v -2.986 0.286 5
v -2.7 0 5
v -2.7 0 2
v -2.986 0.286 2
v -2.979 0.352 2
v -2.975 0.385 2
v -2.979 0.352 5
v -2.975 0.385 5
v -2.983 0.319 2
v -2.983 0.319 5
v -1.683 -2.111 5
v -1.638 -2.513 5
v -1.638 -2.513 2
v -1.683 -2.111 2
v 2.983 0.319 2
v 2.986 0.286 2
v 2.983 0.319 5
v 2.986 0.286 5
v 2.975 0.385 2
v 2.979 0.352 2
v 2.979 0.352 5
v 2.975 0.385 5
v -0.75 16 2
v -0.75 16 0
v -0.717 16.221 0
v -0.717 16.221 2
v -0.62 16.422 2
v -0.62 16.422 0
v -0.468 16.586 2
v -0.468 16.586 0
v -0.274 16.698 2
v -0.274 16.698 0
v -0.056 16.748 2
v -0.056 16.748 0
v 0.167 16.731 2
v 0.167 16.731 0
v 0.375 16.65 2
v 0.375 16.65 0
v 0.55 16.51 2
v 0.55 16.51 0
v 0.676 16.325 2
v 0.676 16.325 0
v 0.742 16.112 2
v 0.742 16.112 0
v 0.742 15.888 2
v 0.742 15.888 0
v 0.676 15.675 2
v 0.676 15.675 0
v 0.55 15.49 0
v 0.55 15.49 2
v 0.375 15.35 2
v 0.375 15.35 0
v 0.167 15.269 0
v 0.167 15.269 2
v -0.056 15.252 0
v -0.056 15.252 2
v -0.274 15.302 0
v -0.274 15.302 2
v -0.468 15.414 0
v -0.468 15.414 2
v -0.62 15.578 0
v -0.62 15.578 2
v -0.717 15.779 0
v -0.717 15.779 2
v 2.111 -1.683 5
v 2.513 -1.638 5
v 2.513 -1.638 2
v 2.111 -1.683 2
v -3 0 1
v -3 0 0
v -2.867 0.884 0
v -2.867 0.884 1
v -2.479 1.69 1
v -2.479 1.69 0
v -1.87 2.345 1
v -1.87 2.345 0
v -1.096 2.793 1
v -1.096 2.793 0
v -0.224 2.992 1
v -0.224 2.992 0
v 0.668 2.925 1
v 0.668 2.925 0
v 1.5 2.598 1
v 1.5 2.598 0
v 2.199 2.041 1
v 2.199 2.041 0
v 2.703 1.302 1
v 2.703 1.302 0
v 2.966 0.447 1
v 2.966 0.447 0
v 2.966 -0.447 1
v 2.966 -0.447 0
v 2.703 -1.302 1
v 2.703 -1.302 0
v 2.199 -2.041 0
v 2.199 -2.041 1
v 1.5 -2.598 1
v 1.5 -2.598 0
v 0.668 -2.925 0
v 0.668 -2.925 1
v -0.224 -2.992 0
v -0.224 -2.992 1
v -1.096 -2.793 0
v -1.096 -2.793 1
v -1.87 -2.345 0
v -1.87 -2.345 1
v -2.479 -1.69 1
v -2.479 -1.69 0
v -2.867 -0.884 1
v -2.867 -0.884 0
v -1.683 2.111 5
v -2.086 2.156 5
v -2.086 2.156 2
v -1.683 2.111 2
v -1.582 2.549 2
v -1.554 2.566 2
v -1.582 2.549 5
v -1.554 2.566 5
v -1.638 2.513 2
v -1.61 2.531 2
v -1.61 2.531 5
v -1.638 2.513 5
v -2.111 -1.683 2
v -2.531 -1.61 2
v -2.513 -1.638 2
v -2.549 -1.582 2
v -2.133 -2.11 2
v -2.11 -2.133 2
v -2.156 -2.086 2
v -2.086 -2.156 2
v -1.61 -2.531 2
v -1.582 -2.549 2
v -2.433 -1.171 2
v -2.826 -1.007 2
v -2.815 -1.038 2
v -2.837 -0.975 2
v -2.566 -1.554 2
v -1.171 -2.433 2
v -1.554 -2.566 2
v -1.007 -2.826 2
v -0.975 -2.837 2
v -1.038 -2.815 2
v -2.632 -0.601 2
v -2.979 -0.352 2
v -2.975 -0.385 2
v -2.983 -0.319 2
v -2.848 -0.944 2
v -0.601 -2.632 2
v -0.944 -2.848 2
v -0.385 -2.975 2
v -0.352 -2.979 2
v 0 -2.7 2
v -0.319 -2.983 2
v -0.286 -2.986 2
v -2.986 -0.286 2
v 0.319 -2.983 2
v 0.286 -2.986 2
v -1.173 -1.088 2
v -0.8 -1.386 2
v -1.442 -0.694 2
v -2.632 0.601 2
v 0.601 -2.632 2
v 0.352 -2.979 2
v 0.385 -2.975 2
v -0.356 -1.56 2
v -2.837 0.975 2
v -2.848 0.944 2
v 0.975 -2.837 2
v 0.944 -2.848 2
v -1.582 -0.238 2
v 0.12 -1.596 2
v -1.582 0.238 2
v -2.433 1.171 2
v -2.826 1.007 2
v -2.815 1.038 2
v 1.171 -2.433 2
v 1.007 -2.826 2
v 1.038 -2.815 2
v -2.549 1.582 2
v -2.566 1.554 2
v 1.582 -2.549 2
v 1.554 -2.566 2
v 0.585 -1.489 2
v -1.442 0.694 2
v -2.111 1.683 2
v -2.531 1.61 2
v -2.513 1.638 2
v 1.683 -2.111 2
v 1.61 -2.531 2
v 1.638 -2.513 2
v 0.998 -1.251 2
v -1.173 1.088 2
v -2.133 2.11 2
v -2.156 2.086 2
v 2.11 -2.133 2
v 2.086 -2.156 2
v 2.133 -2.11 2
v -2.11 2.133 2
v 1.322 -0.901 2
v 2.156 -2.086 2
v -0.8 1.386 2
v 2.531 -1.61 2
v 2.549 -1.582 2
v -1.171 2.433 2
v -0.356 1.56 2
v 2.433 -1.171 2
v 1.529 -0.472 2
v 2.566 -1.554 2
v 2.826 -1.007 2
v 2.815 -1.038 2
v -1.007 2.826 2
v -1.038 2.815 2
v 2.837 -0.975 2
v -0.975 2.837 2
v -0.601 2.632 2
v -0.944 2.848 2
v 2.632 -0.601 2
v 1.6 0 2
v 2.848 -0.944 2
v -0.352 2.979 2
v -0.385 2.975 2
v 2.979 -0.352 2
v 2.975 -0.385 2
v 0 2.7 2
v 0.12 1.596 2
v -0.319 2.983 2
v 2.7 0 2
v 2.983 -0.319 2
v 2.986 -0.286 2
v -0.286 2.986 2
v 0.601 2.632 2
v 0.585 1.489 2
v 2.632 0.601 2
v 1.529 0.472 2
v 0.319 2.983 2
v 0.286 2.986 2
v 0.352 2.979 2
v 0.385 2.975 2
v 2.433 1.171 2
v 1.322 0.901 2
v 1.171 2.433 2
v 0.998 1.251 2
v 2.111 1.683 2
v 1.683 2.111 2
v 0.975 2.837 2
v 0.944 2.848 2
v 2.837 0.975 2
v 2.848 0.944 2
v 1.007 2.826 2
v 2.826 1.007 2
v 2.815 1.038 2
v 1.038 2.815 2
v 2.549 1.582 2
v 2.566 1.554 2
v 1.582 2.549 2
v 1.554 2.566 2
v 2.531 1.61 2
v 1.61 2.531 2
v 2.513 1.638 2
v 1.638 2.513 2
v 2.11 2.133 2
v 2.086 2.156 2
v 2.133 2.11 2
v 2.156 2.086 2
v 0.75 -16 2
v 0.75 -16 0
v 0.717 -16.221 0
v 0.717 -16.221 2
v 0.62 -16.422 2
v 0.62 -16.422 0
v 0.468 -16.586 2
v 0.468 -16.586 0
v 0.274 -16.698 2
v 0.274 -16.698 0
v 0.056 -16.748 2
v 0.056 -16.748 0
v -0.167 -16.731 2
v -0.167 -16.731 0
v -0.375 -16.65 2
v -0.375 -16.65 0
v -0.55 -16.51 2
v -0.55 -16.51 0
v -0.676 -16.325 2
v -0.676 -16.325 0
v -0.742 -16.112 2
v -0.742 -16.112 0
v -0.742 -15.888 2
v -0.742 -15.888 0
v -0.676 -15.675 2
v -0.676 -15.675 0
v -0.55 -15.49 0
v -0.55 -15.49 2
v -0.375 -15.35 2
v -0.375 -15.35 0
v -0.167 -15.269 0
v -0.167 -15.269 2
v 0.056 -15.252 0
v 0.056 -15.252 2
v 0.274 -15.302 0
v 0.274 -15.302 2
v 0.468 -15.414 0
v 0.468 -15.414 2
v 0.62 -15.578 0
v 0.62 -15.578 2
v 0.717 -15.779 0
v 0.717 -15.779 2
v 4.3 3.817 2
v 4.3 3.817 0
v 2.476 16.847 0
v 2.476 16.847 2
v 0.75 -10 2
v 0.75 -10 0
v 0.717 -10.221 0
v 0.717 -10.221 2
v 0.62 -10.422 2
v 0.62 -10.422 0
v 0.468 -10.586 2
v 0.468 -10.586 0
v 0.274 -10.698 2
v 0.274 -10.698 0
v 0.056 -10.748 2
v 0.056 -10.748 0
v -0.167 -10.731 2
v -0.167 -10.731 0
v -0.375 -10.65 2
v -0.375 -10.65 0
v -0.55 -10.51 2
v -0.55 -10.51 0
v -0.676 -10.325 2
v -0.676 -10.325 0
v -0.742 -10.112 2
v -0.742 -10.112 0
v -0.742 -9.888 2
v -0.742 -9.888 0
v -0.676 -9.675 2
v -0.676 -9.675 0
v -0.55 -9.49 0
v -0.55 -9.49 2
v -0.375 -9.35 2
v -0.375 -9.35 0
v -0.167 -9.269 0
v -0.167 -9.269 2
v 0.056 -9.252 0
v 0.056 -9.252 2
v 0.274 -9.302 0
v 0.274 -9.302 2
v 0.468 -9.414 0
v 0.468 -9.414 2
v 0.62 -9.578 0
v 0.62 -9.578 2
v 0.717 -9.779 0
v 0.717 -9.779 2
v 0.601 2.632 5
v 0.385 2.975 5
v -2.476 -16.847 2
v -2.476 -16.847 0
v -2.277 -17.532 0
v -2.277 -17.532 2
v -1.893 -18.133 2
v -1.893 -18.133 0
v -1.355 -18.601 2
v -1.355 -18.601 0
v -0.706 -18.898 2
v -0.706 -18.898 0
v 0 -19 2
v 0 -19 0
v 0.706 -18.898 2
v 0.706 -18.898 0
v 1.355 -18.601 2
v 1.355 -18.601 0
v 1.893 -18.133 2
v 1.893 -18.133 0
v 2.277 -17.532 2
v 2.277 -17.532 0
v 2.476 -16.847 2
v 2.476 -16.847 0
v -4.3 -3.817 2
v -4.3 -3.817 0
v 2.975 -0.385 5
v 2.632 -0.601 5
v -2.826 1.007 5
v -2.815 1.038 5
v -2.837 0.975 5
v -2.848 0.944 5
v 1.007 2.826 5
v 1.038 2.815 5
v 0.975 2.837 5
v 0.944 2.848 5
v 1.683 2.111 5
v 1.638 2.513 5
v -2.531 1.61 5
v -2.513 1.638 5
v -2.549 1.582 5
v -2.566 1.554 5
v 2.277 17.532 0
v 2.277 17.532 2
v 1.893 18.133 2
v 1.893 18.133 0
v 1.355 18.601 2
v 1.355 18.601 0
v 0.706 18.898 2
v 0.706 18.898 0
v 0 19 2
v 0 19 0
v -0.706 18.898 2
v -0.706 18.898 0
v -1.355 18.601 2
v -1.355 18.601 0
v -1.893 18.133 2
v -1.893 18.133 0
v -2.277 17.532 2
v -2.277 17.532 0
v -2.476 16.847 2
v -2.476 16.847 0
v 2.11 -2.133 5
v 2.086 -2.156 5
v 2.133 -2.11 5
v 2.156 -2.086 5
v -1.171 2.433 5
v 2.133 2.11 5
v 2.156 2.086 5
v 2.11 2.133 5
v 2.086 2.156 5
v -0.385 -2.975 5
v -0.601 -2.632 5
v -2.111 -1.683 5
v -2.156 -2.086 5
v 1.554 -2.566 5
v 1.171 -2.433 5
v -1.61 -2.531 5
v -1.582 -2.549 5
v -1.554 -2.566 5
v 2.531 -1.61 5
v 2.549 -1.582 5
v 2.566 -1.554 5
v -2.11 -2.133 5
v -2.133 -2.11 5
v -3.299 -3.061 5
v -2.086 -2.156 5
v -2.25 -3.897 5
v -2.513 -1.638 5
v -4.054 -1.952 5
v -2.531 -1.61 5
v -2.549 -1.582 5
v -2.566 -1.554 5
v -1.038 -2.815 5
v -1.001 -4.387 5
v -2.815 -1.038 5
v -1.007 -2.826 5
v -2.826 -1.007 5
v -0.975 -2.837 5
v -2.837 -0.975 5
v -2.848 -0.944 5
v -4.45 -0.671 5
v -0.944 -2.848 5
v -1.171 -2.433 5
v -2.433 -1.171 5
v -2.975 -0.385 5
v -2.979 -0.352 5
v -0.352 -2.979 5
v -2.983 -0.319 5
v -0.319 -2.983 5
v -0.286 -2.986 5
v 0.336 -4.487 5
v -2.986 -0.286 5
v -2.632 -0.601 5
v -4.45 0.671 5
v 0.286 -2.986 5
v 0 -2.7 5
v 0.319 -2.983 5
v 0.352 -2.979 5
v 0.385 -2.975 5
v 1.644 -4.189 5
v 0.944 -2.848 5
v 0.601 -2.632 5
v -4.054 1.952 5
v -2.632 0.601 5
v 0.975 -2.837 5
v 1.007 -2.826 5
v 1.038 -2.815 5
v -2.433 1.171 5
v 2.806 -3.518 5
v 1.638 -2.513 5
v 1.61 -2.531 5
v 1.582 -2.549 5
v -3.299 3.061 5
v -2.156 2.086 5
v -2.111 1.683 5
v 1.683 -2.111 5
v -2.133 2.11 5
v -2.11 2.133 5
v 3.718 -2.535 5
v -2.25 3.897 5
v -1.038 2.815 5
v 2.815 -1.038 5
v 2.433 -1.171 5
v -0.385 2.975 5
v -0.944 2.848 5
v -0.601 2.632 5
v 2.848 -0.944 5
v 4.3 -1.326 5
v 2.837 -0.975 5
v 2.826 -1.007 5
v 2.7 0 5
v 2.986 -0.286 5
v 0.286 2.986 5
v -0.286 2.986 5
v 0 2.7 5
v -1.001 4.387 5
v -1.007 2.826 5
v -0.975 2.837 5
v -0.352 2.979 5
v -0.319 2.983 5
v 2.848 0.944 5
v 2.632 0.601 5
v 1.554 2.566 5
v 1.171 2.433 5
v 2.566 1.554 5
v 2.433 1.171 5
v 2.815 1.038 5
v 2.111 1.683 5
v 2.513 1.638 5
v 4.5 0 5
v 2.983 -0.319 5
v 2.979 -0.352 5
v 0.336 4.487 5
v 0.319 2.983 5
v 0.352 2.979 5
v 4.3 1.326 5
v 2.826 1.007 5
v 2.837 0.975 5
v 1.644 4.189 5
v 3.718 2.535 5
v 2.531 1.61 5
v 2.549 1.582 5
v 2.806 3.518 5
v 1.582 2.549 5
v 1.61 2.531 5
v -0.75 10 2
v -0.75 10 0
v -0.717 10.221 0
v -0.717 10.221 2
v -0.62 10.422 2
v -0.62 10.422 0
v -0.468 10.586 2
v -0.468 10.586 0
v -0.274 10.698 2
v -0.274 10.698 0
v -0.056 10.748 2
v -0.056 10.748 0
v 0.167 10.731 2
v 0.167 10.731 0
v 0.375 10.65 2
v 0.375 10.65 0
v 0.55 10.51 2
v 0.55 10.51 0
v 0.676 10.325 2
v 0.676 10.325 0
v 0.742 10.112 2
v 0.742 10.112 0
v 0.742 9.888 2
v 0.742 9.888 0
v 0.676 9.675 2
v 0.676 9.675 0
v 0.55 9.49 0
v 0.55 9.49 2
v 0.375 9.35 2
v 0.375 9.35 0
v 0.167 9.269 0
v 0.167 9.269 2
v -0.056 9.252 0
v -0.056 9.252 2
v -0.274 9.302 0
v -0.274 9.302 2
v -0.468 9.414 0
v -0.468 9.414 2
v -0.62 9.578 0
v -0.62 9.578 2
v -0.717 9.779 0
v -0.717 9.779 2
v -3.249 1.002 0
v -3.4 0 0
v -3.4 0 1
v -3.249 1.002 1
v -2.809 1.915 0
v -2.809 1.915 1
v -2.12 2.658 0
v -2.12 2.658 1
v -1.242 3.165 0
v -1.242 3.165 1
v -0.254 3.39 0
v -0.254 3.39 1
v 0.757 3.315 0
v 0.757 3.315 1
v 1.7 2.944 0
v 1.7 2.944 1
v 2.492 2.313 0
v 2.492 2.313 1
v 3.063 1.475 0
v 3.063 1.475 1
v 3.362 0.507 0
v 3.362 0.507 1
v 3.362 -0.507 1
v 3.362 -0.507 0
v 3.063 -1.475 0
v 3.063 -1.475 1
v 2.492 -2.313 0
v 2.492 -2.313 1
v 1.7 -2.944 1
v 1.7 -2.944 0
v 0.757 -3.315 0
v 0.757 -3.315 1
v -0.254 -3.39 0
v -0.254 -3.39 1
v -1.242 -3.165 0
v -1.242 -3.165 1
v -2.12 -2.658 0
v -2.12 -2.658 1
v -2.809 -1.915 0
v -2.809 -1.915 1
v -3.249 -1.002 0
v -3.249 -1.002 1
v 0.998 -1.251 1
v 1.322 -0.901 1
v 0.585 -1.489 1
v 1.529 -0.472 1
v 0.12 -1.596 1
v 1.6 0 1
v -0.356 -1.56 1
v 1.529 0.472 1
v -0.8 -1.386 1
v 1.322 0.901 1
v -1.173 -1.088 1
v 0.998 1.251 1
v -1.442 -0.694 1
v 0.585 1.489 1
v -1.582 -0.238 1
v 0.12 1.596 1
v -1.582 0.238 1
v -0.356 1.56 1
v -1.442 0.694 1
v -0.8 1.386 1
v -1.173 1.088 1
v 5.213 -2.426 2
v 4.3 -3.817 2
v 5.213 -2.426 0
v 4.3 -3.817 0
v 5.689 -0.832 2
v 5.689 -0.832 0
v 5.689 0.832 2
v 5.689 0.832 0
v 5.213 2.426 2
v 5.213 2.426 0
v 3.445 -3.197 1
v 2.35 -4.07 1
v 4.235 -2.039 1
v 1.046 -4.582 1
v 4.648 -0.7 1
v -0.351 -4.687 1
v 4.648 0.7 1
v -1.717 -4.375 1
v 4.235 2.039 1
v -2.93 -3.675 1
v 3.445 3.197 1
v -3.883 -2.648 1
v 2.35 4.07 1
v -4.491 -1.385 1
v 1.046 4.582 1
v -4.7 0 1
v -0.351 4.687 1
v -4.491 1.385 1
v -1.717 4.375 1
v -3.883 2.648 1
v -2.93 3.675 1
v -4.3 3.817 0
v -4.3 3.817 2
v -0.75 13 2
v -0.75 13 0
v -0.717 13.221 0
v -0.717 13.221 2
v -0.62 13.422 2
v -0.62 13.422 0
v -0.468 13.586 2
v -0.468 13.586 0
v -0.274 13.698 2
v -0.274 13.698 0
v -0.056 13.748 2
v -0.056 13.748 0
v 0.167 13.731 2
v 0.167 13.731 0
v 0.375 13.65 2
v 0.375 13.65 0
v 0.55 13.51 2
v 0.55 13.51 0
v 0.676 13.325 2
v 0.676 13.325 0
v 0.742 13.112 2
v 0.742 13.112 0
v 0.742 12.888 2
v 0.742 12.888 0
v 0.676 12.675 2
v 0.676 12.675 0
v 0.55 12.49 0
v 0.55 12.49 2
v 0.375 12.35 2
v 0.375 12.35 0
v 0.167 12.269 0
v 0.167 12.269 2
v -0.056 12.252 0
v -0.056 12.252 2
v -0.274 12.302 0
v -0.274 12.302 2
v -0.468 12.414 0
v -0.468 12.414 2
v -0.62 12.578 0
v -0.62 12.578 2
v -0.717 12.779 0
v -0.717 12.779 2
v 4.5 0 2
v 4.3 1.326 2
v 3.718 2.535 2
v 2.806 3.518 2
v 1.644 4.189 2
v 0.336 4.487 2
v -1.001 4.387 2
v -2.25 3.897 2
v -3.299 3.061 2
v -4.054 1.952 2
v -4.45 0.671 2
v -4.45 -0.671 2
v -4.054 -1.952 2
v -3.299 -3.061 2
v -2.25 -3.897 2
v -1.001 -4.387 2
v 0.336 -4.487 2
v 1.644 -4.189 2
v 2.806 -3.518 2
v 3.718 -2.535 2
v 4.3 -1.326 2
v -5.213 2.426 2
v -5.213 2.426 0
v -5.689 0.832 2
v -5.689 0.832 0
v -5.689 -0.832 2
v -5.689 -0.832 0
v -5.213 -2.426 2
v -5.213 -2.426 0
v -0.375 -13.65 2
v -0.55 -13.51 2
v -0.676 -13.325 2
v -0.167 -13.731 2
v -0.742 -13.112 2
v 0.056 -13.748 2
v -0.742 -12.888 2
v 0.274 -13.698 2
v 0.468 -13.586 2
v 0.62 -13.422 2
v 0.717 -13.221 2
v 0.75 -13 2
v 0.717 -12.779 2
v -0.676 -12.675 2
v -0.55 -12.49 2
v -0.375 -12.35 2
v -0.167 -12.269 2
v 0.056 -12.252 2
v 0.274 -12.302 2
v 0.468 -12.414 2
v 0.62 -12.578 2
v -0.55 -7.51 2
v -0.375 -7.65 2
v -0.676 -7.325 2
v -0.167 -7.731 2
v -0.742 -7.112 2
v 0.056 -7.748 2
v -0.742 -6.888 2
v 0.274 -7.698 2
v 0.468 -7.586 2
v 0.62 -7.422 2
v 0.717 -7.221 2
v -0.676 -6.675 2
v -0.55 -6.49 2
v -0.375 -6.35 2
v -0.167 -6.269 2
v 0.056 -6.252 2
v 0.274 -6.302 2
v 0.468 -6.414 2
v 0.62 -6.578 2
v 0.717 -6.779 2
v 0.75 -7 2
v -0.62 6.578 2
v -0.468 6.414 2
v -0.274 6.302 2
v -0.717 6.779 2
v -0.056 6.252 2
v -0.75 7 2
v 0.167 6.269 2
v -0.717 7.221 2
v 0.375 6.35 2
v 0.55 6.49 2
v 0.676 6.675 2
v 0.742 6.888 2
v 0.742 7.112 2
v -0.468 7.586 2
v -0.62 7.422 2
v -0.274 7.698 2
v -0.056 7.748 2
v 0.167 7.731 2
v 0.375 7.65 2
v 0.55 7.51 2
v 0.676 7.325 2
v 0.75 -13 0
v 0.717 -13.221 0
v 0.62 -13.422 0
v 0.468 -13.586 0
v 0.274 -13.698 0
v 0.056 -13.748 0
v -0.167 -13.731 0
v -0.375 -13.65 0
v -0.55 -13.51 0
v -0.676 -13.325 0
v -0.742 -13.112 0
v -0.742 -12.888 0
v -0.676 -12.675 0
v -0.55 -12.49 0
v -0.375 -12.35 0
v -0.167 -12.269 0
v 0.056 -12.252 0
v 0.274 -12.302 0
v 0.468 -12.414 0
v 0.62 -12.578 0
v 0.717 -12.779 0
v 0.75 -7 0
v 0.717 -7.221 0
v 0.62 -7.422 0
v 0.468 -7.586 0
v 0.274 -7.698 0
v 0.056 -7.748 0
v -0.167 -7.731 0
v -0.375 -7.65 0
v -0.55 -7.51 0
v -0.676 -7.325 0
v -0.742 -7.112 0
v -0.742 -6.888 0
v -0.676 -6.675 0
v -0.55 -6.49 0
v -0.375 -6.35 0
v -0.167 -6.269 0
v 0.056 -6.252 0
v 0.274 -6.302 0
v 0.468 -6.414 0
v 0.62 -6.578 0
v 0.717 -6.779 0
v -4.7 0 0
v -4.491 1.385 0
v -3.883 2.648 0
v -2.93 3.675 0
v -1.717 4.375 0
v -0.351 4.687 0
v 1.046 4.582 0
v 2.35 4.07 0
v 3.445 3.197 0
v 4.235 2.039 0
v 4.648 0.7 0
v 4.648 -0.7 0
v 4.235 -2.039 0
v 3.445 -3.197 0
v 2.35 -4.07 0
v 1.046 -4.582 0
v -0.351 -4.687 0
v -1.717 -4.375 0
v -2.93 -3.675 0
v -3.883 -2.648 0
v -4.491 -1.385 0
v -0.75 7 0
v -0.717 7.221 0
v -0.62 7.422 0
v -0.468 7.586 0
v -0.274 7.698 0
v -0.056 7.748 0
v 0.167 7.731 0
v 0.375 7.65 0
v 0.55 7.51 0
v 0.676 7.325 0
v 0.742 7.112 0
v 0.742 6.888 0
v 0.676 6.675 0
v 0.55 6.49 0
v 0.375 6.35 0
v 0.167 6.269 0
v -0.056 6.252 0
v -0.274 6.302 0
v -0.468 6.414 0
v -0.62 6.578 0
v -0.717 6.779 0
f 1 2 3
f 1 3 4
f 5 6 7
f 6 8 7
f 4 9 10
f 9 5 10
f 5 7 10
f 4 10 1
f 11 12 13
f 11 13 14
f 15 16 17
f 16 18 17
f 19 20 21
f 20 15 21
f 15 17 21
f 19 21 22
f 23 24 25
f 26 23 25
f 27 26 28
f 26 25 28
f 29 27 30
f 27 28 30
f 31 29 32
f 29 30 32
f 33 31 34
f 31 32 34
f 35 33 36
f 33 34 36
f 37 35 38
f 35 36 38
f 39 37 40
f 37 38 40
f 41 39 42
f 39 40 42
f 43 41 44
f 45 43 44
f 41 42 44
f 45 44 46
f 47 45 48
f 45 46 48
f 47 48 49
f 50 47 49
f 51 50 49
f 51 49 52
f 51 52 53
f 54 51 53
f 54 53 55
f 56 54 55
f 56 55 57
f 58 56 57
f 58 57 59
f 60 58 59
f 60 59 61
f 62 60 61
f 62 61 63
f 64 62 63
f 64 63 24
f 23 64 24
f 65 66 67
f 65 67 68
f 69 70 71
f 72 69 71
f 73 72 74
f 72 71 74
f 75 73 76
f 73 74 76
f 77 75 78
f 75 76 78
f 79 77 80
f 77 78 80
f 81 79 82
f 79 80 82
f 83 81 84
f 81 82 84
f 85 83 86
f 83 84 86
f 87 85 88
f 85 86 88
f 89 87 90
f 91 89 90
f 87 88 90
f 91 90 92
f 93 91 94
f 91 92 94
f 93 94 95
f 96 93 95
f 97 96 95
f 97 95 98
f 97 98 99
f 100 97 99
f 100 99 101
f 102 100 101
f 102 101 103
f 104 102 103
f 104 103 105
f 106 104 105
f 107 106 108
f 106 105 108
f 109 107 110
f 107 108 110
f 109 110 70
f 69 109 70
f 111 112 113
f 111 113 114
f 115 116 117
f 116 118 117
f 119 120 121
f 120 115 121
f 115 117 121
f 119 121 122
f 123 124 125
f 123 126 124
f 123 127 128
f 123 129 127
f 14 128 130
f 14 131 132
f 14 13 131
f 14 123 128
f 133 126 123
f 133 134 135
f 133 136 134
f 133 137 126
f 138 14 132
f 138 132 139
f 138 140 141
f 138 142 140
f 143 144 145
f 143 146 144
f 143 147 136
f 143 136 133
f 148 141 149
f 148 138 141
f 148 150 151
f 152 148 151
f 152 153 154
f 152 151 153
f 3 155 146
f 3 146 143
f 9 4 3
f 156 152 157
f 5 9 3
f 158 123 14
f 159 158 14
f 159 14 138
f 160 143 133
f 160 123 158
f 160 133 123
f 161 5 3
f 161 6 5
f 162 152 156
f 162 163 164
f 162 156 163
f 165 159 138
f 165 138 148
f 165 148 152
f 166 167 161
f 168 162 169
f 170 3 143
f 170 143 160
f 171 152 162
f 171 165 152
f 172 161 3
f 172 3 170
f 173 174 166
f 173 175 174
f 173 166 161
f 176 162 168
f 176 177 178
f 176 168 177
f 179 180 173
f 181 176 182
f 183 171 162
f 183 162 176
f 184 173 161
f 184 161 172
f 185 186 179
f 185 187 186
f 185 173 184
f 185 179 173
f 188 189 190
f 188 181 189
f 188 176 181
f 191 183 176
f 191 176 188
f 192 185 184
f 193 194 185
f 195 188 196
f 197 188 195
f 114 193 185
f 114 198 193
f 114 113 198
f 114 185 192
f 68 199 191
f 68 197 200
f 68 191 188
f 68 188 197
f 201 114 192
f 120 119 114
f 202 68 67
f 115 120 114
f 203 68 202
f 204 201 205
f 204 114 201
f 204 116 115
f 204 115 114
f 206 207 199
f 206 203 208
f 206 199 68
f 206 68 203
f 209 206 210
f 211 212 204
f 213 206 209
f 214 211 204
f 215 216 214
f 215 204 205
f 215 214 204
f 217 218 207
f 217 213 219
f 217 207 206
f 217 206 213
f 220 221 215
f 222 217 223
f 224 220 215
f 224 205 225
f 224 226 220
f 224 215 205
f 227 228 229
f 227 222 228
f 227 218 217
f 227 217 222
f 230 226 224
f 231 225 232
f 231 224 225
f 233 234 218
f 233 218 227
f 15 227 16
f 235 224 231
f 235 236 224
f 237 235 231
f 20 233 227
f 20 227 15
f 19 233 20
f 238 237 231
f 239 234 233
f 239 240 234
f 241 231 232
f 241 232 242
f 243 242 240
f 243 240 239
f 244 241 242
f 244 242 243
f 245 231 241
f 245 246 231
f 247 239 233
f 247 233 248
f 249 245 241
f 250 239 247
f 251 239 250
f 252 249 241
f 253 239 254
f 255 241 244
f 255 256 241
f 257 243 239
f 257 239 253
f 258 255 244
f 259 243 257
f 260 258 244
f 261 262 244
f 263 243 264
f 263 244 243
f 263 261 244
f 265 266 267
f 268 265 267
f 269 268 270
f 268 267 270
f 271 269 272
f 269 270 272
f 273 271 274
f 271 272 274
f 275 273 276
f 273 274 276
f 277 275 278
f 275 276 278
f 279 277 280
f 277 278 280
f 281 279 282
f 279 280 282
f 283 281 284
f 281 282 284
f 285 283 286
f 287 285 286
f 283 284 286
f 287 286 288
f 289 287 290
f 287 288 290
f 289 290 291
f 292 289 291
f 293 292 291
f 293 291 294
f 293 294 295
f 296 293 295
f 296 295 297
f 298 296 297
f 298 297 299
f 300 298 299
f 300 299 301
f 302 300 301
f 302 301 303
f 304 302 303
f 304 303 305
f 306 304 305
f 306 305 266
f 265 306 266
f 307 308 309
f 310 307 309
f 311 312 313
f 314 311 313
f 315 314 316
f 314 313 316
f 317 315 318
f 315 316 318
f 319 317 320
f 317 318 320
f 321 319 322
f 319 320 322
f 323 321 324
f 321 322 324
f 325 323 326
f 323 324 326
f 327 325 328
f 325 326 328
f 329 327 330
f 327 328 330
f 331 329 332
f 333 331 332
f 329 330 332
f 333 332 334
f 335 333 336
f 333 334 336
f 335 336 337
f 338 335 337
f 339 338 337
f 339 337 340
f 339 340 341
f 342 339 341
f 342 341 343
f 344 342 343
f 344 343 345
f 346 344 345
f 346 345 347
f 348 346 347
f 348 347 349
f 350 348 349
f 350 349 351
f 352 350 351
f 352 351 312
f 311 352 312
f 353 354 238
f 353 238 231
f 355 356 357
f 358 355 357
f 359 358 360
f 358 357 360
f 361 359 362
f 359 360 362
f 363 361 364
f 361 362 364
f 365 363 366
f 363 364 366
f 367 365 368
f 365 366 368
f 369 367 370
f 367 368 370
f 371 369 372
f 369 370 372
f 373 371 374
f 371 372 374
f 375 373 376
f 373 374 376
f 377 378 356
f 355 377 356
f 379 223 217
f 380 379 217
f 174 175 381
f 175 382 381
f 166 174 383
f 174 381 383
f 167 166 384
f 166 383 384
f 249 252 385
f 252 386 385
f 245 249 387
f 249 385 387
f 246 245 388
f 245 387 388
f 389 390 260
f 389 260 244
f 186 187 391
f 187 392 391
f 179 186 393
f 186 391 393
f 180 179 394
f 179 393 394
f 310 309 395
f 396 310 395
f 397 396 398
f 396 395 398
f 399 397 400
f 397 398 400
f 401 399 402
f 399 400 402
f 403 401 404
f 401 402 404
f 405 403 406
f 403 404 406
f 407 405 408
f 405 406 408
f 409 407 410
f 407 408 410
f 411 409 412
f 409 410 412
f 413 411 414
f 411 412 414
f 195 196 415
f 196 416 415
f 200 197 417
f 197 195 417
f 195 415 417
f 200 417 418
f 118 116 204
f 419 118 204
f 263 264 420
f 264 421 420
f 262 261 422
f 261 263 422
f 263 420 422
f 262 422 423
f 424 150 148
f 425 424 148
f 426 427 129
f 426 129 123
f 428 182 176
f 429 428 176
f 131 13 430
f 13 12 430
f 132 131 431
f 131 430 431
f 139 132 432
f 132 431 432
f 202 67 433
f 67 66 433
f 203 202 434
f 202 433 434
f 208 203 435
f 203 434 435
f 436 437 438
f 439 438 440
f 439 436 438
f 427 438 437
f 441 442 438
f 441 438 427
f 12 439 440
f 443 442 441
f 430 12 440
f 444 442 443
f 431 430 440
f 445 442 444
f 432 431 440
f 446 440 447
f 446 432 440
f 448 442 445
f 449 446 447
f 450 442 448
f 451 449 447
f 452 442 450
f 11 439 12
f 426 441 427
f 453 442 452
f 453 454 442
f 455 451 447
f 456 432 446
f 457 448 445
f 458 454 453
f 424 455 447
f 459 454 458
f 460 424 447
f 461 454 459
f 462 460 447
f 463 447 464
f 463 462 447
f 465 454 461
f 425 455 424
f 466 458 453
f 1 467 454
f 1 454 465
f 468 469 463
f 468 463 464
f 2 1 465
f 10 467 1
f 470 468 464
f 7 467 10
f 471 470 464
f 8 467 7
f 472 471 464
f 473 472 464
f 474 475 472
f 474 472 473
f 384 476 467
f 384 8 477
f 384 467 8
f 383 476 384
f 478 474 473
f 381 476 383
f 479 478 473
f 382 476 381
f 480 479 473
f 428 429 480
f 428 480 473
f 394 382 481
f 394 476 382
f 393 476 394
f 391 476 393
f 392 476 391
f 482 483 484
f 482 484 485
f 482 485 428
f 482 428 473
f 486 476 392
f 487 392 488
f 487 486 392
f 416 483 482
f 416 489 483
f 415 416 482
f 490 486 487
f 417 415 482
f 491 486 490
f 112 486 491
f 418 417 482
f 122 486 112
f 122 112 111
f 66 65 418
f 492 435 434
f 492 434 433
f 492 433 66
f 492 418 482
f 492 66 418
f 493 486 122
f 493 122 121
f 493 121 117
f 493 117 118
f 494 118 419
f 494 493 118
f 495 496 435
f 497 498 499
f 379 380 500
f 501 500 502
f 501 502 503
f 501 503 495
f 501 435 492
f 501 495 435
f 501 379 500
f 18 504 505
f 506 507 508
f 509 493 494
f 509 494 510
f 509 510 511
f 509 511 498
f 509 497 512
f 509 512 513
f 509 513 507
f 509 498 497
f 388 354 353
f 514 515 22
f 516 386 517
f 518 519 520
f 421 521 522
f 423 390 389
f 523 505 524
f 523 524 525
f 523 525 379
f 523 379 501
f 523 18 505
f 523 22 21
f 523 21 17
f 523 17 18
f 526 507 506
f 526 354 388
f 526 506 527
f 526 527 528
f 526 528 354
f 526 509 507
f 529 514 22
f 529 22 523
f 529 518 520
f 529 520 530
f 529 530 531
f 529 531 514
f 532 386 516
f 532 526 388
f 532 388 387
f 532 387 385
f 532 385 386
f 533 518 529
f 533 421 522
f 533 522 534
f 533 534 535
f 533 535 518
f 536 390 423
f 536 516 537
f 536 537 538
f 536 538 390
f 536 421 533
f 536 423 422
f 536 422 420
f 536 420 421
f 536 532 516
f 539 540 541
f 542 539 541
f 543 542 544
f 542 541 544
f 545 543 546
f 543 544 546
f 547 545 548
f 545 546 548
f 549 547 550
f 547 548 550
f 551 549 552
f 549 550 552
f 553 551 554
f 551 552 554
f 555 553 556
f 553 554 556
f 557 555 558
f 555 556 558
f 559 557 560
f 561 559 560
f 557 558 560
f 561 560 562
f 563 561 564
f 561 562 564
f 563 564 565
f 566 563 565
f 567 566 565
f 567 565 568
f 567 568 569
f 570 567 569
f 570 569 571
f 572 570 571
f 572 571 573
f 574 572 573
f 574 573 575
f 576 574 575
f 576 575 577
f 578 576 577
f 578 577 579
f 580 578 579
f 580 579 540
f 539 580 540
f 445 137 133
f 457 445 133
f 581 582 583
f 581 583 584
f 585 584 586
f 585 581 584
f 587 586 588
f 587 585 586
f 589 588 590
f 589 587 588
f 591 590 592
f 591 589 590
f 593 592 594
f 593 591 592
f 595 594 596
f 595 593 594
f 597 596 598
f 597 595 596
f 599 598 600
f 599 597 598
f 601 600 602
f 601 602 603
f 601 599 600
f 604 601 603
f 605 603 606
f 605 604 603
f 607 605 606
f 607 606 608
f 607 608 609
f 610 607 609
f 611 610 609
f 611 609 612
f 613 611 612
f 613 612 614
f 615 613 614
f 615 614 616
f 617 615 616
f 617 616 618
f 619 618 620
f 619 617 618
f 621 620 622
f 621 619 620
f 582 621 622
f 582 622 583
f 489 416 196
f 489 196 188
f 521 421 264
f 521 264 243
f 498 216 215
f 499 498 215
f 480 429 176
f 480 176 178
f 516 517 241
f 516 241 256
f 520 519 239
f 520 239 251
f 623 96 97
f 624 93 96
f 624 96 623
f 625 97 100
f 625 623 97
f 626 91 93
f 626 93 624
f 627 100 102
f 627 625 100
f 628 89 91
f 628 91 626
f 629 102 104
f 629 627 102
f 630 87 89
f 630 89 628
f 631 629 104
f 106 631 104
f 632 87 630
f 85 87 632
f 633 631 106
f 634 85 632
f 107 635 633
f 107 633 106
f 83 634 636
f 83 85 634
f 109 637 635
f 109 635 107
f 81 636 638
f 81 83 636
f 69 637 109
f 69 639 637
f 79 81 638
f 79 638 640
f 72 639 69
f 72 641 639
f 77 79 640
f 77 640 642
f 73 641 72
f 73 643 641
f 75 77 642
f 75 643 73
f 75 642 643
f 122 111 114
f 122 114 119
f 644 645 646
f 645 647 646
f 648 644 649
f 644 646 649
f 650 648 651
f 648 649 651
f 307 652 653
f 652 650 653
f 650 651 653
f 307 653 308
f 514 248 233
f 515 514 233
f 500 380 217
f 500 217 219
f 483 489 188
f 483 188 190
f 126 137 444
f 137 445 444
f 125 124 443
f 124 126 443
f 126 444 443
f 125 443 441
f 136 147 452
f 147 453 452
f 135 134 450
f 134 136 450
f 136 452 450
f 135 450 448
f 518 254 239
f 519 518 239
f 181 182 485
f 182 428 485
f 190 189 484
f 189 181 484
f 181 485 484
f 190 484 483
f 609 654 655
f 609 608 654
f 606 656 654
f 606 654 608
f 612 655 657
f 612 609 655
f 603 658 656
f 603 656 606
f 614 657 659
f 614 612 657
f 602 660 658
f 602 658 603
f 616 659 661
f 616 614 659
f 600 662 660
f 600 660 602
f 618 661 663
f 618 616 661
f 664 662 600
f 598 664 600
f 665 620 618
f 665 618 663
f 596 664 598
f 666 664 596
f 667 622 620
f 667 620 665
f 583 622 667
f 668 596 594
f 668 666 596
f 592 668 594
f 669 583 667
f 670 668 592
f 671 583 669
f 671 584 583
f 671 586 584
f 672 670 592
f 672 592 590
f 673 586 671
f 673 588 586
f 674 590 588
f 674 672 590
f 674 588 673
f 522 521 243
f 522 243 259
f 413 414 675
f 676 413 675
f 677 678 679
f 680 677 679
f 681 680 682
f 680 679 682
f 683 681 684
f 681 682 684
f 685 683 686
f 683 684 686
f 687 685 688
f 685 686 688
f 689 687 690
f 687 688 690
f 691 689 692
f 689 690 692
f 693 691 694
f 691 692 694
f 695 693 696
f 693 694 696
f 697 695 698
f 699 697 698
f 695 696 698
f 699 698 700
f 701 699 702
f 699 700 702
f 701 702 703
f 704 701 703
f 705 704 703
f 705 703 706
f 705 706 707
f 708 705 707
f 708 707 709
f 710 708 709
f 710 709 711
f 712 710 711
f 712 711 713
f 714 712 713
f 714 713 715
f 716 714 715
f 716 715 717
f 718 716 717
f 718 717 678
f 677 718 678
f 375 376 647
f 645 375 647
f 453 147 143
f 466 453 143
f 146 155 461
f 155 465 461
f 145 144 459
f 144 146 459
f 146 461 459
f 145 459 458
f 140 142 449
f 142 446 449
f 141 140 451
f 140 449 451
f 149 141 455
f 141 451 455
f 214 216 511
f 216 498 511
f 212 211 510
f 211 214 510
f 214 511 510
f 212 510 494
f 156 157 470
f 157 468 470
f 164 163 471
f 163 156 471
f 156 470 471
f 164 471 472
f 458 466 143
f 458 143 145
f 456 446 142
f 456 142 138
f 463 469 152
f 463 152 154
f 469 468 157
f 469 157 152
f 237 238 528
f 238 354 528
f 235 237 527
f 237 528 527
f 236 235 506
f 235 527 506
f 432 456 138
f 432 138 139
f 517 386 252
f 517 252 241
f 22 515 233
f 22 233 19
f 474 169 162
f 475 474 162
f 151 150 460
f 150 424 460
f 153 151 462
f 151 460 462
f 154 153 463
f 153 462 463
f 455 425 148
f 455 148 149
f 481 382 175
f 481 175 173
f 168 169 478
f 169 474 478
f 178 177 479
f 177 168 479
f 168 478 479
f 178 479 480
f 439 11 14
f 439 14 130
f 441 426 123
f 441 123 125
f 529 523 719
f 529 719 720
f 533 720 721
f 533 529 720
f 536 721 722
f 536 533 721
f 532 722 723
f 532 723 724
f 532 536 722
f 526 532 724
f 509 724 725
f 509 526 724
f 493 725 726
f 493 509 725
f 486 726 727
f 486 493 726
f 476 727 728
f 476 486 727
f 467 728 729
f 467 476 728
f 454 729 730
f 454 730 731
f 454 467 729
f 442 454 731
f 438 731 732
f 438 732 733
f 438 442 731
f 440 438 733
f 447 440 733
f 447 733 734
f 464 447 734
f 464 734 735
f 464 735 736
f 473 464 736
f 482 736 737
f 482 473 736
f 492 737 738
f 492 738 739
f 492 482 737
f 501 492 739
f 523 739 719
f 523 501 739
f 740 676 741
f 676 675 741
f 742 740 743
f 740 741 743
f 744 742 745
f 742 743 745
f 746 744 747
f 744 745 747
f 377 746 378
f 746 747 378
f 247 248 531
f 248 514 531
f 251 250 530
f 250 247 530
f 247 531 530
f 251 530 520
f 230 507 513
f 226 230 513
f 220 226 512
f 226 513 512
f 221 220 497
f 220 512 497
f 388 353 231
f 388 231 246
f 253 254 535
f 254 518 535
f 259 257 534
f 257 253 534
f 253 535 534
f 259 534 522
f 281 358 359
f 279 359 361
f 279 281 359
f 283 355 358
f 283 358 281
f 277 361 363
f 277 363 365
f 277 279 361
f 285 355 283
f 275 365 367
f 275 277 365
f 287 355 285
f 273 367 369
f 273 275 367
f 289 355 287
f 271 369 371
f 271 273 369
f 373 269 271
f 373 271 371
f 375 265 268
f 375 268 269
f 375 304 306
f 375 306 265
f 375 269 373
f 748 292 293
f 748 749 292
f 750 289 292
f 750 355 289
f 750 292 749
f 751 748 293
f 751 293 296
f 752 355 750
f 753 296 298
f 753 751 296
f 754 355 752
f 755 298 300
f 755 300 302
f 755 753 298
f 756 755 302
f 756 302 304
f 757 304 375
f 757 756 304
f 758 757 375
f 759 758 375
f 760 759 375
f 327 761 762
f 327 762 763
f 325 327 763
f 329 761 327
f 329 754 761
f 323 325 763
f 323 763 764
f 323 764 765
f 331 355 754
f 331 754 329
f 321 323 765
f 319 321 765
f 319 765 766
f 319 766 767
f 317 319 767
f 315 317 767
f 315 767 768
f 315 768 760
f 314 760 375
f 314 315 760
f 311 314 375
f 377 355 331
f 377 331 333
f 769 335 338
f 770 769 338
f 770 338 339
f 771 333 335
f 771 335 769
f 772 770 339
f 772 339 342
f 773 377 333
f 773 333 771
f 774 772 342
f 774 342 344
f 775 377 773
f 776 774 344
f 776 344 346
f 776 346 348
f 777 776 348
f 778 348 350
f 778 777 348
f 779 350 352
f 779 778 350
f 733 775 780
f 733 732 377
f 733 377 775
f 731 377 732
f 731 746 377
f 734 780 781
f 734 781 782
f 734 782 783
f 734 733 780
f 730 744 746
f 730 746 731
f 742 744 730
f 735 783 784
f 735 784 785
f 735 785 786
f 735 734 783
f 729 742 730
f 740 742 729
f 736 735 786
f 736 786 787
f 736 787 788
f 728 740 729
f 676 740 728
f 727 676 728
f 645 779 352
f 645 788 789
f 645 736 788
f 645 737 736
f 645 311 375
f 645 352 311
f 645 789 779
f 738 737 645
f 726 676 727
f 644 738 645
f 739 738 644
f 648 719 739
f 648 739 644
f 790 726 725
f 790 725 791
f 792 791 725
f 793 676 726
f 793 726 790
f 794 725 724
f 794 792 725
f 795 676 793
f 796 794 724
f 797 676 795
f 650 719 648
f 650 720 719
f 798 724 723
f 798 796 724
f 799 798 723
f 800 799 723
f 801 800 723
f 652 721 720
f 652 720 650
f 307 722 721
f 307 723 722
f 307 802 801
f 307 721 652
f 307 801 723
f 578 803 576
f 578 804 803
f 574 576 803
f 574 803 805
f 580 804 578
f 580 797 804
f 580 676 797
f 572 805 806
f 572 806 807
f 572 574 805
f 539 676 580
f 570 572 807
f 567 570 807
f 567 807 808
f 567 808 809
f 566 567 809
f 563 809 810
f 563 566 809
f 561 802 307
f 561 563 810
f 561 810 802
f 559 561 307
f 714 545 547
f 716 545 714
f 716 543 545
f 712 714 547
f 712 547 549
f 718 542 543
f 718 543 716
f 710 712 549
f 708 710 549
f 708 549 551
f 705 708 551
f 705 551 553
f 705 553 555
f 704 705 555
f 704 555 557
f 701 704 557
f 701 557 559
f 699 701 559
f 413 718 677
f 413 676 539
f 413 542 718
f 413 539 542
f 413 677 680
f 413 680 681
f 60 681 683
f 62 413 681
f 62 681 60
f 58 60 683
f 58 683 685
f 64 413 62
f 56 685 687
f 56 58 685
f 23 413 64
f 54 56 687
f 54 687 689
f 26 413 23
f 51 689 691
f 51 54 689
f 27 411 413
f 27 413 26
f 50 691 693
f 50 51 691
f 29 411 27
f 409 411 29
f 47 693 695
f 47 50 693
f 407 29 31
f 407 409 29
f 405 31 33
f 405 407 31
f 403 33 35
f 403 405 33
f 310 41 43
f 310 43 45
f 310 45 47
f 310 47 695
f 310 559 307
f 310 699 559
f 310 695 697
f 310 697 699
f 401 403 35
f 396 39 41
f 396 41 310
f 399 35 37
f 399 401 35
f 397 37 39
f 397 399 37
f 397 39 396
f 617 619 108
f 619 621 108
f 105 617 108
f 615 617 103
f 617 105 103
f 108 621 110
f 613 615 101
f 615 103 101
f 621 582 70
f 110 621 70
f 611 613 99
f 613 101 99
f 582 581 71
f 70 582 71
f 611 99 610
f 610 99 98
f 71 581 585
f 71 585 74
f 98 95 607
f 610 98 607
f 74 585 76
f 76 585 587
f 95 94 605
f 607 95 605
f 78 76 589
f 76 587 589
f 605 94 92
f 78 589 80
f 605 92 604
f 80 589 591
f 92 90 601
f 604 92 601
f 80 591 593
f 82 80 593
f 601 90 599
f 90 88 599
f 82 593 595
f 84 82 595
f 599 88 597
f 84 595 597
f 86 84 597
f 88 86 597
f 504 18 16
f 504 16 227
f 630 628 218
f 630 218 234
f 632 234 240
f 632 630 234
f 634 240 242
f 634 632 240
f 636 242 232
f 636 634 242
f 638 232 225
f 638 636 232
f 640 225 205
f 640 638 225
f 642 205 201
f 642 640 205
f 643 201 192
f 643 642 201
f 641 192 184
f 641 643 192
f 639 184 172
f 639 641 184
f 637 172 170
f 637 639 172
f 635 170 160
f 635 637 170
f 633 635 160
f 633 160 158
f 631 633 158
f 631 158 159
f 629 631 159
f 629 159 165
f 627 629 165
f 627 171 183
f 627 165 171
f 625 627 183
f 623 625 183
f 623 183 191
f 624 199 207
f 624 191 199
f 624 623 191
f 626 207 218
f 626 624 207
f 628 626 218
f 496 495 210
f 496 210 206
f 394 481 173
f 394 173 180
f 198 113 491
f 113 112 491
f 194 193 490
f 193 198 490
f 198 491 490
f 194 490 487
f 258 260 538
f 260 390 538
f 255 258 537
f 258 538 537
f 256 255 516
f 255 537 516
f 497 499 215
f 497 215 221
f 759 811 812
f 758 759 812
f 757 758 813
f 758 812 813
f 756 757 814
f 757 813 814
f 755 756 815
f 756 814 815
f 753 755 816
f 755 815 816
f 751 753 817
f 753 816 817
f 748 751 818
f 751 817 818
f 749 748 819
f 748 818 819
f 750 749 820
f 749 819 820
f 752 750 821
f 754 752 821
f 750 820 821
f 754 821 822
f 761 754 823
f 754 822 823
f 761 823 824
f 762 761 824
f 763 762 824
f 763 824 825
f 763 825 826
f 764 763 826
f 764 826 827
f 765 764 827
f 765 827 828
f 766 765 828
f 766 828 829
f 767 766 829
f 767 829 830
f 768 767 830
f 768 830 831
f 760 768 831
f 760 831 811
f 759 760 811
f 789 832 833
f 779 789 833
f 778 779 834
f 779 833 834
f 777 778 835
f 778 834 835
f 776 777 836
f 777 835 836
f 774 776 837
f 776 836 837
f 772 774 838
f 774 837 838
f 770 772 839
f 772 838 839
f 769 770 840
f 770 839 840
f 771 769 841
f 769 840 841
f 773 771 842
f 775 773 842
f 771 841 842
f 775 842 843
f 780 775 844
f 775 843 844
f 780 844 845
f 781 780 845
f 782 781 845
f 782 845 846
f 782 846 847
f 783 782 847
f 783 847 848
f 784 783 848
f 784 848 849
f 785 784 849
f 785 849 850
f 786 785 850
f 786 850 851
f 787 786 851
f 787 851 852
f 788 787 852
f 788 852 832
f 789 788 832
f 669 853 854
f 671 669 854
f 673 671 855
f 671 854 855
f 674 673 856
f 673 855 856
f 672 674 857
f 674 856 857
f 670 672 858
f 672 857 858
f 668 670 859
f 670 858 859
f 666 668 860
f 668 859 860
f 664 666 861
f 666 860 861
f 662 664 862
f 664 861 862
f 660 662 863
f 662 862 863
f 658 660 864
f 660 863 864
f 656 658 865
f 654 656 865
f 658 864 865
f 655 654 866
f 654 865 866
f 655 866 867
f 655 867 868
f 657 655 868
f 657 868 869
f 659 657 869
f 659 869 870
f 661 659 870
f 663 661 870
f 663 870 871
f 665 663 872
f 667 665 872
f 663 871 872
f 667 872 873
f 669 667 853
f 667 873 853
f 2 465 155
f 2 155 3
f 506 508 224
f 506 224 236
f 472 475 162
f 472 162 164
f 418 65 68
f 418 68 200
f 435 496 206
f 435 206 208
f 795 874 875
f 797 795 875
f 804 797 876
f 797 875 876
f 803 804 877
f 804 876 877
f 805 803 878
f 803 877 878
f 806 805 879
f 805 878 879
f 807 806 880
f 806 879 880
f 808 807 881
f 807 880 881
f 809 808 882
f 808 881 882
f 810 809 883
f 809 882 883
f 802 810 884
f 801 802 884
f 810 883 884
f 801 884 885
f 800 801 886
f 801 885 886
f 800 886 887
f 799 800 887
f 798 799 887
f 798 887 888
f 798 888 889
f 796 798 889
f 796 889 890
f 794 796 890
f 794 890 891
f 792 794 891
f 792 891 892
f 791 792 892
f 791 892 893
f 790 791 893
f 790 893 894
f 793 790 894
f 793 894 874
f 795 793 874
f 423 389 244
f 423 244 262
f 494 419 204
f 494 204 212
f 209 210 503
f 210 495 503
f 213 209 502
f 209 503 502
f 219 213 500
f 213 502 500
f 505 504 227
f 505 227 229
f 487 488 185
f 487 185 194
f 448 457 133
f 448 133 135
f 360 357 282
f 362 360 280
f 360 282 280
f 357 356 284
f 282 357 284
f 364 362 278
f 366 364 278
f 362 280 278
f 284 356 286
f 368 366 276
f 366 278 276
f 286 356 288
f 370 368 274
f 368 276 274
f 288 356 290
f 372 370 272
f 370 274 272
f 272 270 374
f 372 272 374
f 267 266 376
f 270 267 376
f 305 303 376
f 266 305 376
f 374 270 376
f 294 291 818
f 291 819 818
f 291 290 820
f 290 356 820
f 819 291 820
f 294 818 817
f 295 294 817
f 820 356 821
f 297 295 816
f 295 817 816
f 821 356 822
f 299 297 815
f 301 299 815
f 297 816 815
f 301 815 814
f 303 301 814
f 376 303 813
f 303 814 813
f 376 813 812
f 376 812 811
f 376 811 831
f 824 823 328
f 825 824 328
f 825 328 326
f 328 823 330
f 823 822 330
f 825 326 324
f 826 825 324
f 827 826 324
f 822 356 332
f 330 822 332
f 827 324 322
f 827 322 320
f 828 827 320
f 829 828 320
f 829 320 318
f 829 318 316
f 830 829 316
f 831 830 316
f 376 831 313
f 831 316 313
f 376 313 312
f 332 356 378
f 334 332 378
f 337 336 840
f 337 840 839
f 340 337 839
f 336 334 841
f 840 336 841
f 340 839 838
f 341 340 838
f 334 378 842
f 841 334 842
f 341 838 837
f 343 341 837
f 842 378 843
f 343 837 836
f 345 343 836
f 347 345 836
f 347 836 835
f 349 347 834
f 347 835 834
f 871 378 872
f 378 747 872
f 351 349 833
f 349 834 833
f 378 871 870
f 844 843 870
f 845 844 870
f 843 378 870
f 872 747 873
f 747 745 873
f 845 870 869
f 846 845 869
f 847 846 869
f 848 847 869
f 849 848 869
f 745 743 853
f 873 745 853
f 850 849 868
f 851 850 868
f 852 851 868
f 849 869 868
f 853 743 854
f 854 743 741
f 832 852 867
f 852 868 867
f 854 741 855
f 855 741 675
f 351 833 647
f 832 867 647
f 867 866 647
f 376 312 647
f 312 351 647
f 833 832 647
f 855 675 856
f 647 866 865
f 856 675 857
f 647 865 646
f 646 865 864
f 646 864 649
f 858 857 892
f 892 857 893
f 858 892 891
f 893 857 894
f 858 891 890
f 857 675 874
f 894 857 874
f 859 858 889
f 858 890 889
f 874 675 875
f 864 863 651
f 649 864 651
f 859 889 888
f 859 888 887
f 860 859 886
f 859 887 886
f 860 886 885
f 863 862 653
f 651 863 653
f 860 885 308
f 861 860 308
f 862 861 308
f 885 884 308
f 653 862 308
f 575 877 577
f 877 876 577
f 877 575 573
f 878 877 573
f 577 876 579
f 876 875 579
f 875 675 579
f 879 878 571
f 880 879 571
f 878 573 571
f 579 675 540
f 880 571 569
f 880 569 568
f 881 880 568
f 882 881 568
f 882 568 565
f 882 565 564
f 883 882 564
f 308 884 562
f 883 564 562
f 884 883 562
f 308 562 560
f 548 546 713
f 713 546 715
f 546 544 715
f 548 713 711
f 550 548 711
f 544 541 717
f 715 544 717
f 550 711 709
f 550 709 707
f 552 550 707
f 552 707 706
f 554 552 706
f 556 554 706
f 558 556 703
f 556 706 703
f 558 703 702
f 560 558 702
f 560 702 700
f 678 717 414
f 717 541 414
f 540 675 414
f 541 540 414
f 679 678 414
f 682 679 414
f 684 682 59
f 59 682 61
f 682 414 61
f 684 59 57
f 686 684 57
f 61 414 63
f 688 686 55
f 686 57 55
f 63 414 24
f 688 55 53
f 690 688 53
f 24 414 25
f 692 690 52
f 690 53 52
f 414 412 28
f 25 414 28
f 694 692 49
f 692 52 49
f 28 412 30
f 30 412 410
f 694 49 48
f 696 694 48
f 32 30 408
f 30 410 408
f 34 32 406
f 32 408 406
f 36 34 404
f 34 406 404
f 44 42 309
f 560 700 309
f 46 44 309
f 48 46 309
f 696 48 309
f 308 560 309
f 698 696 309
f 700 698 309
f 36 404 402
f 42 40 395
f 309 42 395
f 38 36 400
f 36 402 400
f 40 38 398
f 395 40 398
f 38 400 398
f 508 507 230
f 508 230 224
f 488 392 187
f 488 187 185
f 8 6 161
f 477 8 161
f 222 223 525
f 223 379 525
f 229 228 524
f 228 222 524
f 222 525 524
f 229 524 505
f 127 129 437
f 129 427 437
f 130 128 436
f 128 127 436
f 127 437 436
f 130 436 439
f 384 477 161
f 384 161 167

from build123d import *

# Parameters (mm, degrees)
ESQUISSE1_R                  = 5.75
ESQUISSE1_R_2                = 1.6
BOSS_EXTRU_1_DEPTH           = 5
ESQUISSE2_R                  = 3
ENL_V_MAT_EXTRU_1_DEPTH      = 3
ESQUISSE3_R                  = 5.75
ESQUISSE3_R_2                = 4.5
ENL_V_MAT_EXTRU_2_DEPTH      = 3
BOSS_EXTRU_2_DEPTH           = 2
R_P_TITION_CIRCULAIRE1_COUNT = 2
ESQUISSE5_R                  = 0.75
ENL_V_MAT_EXTRU_3_DEPTH      = 3
R_P_TITION_CIRCULAIRE2_COUNT = 2
BOSS_EXTRU_3_DEPTH           = 3
R_P_TITION_CIRCULAIRE3_COUNT = 28
ESQUISSE7_R                  = 3
ESQUISSE7_R_2                = 1.6
ENL_V_MAT_EXTRU_4_DEPTH      = 1
ESQUISSE8_R                  = 4.7
ESQUISSE8_R_2                = 3.4
ENL_V_MAT_EXTRU_5_DEPTH      = 1


with BuildPart() as part:
    # Esquisse1 → Boss.-Extru.1 (new body)
    with BuildSketch(Plane.XY):
        Circle(ESQUISSE1_R)
        Circle(ESQUISSE1_R_2, mode=Mode.SUBTRACT)
    extrude(amount=BOSS_EXTRU_1_DEPTH)

    # Esquisse2 → Enlèv. mat.-Extru.1 (cut)
    with BuildSketch(Plane.XY.offset(5)):
        Circle(ESQUISSE2_R)
    extrude(amount=-ENL_V_MAT_EXTRU_1_DEPTH, mode=Mode.SUBTRACT)

    # Esquisse3 → Enlèv. mat.-Extru.2 (cut)
    with BuildSketch(Plane.XY.offset(5)):
        Circle(ESQUISSE3_R)
        Circle(ESQUISSE3_R_2, mode=Mode.SUBTRACT)
    extrude(amount=-ENL_V_MAT_EXTRU_2_DEPTH, mode=Mode.SUBTRACT)

    # Esquisse4 → Boss.-Extru.2 (add)
    with BuildSketch(Plane(origin=(0, 0, 0), x_dir=(-1, 0, 0), z_dir=(0, 0, -1))):
        with BuildLine():
            Line((-4.3, 3.817394399), (-2.475852955, 16.846629695))
            ThreePointArc((-2.475852955, 16.846629695), (0, 19), (2.475852955, 16.846629695))
            Line((2.475852955, 16.846629695), (4.3, 3.817394399))
            ThreePointArc((4.3, 3.817394399), (0, 5.75), (-4.3, 3.817394399))
        make_face()
    boss_extru_2 = extrude(amount=-BOSS_EXTRU_2_DEPTH)

    # Répétition circulaire1: Boss.-Extru.2 ×2 about axis
    r_p_tition_circulaire1_axis = Axis((0, 0, 0), (0, 0, 1))
    for i in range(1, R_P_TITION_CIRCULAIRE1_COUNT):
        add(boss_extru_2.rotate(r_p_tition_circulaire1_axis, i * 360 / R_P_TITION_CIRCULAIRE1_COUNT))

    # Esquisse5 → Enlèv. mat.-Extru.3 (cut)
    with BuildSketch(Plane(origin=(0, 0, 0), x_dir=(-1, 0, 0), z_dir=(0, 0, -1))):
        with Locations((0, 7)):
            Circle(ESQUISSE5_R)
        with Locations((0, 10)):
            Circle(ESQUISSE5_R)
        with Locations((0, 13)):
            Circle(ESQUISSE5_R)
        with Locations((0, 16)):
            Circle(ESQUISSE5_R)
    enl_v_mat_extru_3 = extrude(amount=-ENL_V_MAT_EXTRU_3_DEPTH, mode=Mode.SUBTRACT)

    # Répétition circulaire2: Enlèv. mat.-Extru.3 ×2 about axis
    r_p_tition_circulaire2_axis = Axis((0, 0, 0), (0, 0, 1))
    for i in range(1, R_P_TITION_CIRCULAIRE2_COUNT):
        add(enl_v_mat_extru_3.rotate(r_p_tition_circulaire2_axis, i * 360 / R_P_TITION_CIRCULAIRE2_COUNT), mode=Mode.SUBTRACT)

    # Esquisse6 → Boss.-Extru.3 (add)
    with BuildSketch(Plane.XY.offset(5)):
        Polygon((-0.3, 3), (0, 2.7), (0.3, 3), align=None)
    boss_extru_3 = extrude(amount=-BOSS_EXTRU_3_DEPTH)

    # Répétition circulaire3: Boss.-Extru.3 ×28 about axis
    r_p_tition_circulaire3_axis = Axis((0, 0, 0), (0, 0, 1))
    for i in range(1, R_P_TITION_CIRCULAIRE3_COUNT):
        add(boss_extru_3.rotate(r_p_tition_circulaire3_axis, i * 360 / R_P_TITION_CIRCULAIRE3_COUNT))

    # Esquisse7 → Enlèv. mat.-Extru.4 (cut)
    with BuildSketch(Plane(origin=(0, 0, 0), x_dir=(-1, 0, 0), z_dir=(0, 0, -1))):
        Circle(ESQUISSE7_R)
        Circle(ESQUISSE7_R_2, mode=Mode.SUBTRACT)
    extrude(amount=-ENL_V_MAT_EXTRU_4_DEPTH, mode=Mode.SUBTRACT)

    # Esquisse8 → Enlèv. mat.-Extru.5 (cut)
    with BuildSketch(Plane(origin=(0, 0, 0), x_dir=(-1, 0, 0), z_dir=(0, 0, -1))):
        Circle(ESQUISSE8_R)
        Circle(ESQUISSE8_R_2, mode=Mode.SUBTRACT)
    extrude(amount=-ENL_V_MAT_EXTRU_5_DEPTH, mode=Mode.SUBTRACT)


solid = part.part
